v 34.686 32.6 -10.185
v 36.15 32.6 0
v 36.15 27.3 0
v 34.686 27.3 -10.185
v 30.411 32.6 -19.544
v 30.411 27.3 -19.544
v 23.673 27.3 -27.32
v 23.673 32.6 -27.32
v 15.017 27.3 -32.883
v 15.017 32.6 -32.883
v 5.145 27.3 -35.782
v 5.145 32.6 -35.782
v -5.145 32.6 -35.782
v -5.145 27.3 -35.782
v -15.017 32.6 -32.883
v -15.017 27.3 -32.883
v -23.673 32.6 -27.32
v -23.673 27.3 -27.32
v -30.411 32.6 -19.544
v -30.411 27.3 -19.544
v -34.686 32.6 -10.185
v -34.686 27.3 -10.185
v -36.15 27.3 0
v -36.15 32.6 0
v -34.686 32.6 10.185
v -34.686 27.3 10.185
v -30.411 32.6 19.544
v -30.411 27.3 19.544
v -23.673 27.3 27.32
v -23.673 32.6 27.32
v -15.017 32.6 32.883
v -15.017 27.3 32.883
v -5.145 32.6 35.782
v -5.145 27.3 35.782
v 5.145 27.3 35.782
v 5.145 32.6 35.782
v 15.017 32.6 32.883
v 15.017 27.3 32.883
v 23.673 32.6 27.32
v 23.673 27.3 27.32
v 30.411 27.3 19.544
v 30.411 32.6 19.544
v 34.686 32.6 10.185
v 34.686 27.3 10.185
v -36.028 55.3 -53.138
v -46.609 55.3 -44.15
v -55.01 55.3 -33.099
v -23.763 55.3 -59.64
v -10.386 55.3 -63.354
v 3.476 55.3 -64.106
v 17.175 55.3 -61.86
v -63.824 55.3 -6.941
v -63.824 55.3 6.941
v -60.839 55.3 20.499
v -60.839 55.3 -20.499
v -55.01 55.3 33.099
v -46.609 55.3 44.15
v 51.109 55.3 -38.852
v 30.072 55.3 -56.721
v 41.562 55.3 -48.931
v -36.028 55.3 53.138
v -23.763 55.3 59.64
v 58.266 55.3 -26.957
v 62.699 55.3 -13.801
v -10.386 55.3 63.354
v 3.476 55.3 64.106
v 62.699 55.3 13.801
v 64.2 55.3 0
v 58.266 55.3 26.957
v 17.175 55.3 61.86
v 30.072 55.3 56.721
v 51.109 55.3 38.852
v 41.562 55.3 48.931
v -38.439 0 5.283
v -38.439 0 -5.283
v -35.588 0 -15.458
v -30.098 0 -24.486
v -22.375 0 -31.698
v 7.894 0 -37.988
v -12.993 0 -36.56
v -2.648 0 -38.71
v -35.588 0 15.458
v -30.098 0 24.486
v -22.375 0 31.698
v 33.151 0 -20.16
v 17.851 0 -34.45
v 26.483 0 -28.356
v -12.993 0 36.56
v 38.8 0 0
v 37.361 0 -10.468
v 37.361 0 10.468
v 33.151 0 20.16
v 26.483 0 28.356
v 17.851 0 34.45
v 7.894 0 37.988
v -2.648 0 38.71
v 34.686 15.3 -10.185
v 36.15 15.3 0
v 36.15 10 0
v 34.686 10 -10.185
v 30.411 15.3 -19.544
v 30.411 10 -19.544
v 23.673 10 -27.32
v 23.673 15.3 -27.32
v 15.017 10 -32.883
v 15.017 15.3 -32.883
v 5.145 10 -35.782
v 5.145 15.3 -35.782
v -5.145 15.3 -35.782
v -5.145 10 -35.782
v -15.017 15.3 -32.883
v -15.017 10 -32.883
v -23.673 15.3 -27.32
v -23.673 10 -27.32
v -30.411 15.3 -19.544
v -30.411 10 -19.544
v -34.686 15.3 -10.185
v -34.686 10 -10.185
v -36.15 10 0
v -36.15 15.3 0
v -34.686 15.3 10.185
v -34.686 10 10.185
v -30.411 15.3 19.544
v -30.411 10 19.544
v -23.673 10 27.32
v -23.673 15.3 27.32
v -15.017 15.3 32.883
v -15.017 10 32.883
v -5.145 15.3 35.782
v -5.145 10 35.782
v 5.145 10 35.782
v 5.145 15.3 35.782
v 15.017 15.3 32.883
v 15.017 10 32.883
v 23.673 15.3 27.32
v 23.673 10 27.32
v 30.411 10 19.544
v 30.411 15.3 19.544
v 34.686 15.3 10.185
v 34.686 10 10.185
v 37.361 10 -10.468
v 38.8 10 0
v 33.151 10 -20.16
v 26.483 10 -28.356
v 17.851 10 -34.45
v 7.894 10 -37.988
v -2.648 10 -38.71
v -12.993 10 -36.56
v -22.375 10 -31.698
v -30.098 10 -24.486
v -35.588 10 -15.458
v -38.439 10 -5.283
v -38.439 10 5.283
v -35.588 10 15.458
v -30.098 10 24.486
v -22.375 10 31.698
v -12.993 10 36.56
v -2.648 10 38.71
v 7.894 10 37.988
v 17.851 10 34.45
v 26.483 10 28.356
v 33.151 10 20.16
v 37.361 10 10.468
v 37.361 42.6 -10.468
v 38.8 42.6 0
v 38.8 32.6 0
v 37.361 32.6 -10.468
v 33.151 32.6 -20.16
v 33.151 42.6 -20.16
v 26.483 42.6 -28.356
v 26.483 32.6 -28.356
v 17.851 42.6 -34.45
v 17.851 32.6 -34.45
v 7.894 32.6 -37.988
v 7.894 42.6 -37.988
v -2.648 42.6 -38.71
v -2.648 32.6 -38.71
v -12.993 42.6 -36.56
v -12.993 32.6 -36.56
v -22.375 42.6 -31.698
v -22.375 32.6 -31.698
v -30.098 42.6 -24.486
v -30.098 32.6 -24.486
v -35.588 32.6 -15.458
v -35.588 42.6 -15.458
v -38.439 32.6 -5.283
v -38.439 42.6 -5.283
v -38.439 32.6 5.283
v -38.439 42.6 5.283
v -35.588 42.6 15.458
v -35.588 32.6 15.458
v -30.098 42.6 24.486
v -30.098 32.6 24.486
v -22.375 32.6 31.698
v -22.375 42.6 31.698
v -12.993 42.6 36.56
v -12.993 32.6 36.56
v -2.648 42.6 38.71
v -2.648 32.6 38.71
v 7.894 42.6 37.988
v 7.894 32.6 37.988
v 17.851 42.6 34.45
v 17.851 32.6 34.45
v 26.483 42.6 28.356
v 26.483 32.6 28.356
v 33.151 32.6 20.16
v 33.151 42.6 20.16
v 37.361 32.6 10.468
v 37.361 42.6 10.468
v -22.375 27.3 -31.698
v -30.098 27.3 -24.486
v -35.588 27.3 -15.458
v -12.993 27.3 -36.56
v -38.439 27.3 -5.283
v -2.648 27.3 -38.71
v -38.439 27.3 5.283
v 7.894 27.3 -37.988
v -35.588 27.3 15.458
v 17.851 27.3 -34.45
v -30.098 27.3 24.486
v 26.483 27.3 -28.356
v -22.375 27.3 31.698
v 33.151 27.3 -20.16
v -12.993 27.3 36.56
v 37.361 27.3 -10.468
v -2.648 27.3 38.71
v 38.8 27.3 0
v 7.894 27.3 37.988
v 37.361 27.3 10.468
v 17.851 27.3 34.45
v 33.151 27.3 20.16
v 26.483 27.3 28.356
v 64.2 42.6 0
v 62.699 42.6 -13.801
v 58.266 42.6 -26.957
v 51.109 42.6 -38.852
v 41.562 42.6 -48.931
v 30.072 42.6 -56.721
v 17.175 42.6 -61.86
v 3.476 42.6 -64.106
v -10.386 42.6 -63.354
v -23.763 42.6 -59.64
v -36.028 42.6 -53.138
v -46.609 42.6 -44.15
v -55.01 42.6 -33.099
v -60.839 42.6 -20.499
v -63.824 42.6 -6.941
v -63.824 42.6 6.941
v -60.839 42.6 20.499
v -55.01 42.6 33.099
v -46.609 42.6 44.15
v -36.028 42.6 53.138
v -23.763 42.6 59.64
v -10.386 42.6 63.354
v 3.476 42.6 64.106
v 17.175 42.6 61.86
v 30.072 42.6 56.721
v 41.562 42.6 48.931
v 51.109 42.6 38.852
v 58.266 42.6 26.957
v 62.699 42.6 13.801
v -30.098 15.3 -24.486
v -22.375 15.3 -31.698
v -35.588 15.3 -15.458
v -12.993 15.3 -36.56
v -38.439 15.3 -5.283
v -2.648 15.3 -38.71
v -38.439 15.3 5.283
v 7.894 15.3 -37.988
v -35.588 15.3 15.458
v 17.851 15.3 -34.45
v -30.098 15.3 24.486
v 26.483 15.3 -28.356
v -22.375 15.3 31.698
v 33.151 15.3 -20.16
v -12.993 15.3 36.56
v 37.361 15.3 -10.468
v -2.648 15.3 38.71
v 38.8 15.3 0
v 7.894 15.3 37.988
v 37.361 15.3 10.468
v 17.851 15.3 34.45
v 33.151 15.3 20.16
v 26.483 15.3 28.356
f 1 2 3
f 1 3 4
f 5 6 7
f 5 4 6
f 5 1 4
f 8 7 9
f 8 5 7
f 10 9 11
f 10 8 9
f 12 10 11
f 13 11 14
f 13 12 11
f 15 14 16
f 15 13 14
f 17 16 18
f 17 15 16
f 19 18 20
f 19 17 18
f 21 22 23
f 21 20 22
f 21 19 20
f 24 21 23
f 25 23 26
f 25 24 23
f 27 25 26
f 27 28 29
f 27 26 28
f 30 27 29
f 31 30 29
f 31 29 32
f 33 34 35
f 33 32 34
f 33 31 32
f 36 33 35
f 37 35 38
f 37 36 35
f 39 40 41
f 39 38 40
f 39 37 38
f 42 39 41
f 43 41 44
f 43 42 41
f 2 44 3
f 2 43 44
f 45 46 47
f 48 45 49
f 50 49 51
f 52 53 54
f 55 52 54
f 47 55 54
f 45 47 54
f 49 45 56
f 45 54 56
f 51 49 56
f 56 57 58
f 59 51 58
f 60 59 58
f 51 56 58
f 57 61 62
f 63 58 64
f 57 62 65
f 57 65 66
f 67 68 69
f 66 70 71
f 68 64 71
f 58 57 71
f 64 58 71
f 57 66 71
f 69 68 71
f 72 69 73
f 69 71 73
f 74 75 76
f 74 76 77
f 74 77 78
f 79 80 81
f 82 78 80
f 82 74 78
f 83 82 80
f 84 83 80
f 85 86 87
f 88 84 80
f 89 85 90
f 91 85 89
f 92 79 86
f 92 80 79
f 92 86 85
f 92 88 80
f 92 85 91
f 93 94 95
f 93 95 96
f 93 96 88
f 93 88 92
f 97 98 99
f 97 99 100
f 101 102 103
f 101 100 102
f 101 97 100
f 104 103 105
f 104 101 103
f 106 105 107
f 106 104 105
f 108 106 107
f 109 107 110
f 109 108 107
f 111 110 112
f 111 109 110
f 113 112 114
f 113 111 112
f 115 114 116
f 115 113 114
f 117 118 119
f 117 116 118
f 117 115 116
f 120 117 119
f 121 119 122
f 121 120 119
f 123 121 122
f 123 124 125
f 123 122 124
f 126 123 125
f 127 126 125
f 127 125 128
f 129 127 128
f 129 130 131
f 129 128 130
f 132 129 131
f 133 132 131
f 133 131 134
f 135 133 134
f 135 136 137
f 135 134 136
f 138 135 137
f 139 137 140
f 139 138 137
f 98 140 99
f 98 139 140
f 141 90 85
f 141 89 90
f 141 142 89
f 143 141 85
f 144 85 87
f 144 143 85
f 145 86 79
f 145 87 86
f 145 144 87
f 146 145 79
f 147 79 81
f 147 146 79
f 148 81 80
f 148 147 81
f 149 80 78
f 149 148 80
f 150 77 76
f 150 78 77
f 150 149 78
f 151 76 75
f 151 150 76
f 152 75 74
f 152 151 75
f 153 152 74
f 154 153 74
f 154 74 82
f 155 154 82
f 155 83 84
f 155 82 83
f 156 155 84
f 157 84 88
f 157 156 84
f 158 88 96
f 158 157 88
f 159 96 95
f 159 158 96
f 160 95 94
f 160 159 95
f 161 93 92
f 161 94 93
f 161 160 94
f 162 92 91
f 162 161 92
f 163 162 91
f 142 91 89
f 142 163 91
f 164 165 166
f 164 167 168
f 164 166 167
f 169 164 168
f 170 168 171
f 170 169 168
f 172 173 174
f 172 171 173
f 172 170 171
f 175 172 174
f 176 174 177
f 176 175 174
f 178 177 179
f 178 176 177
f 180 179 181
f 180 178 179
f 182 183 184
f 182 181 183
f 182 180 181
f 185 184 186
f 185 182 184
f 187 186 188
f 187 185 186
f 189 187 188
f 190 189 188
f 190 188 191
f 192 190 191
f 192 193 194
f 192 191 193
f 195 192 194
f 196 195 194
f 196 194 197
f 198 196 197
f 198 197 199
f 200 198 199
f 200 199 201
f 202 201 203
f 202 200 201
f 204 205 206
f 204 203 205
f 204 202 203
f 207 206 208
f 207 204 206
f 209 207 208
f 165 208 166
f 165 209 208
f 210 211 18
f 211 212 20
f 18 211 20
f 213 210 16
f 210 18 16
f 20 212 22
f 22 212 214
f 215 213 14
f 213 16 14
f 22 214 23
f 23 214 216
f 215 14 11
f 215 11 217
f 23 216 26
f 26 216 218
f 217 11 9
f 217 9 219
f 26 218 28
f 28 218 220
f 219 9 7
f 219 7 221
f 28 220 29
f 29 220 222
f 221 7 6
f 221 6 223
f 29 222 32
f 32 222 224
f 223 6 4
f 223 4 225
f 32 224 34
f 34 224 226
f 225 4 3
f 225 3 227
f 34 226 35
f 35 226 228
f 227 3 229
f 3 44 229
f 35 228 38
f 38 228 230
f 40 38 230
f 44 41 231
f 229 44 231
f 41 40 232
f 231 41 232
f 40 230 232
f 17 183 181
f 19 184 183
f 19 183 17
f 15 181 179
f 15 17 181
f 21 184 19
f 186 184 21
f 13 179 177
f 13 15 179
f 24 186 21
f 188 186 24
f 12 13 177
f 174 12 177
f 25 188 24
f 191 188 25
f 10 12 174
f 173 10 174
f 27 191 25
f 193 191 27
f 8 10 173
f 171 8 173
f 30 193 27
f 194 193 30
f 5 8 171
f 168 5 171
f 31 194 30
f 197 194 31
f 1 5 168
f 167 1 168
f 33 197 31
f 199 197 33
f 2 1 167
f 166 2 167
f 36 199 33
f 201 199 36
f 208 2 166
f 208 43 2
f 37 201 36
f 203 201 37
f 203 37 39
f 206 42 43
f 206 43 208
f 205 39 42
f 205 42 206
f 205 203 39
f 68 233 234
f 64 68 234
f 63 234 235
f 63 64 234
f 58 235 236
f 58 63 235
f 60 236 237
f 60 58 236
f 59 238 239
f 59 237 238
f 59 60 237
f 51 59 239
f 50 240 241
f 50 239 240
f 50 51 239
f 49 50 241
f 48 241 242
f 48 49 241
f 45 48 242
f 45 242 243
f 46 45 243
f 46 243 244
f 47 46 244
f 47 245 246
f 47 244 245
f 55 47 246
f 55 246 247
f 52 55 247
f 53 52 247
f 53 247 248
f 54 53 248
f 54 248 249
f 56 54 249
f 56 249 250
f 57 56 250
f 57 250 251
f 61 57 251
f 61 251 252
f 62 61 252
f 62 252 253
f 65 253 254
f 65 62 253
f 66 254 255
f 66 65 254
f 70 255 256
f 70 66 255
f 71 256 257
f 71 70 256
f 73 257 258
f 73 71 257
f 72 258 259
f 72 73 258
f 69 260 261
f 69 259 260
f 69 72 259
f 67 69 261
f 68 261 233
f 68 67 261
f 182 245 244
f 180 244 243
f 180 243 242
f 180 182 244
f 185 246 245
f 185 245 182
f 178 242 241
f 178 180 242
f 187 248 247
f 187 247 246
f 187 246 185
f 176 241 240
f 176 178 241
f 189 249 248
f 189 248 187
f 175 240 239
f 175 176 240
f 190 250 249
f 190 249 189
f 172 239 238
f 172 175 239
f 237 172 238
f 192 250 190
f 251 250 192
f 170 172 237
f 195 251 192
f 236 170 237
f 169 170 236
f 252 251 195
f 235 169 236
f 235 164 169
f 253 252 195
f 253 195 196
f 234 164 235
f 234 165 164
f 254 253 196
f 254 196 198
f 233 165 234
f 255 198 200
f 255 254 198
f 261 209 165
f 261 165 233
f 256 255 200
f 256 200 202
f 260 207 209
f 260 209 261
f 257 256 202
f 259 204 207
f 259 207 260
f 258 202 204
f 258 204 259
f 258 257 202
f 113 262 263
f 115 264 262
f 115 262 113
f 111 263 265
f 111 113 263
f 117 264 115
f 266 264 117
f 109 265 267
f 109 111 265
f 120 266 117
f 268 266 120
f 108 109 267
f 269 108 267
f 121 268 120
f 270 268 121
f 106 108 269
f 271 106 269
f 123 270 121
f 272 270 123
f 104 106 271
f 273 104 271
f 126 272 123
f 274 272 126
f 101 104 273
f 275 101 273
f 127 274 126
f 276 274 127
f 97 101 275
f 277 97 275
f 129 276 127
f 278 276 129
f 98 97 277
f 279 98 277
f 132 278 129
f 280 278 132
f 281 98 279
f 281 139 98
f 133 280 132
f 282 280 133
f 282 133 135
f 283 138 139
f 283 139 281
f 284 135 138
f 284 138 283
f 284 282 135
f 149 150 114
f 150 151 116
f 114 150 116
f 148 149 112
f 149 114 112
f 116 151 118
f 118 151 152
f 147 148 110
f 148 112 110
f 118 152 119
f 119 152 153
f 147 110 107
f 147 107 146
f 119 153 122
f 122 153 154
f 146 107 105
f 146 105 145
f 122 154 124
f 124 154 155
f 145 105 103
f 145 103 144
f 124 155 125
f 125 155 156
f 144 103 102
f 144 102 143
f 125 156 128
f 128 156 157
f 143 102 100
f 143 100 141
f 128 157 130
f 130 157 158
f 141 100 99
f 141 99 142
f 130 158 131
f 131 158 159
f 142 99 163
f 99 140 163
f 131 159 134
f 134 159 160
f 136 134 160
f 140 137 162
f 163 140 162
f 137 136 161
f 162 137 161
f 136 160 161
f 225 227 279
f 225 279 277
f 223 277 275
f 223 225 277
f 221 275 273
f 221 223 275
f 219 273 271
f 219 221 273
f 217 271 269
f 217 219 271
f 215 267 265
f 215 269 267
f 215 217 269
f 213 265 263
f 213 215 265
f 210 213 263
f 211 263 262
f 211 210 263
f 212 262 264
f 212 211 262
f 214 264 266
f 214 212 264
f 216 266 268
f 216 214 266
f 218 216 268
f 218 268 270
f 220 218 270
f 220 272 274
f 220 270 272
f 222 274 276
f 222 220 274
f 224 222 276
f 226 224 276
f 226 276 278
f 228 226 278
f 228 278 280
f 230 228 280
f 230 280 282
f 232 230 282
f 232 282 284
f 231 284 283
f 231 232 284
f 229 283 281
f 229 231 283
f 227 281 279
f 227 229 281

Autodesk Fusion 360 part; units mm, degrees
sketch "Sketch1" plane through (0, 0, 0) normal (0, 0, 1) x (1, 0, 0)
  line L0 (0, 0) -> (38.8, 0)
  line L1 (38.8, 0) -> (38.8, 10)
  line L2 (38.8, 10) -> (36.15, 10)
  line L3 (36.15, 10) -> (36.15, 15.3)
  line L4 (36.15, 15.3) -> (38.8, 15.3)
  line L5 (38.8, 15.3) -> (38.8, 27.3)
  line L6 (38.8, 27.3) -> (36.15, 27.3)
  line L7 (36.15, 27.3) -> (36.15, 32.6)
  line L8 (36.15, 32.6) -> (38.8, 32.6)
  line L9 (38.8, 32.6) -> (38.8, 42.6)
  line L10 (38.8, 42.6) -> (64.2, 42.6)
  line L11 (64.2, 42.6) -> (64.2, 55.3)
  line L12 (64.2, 55.3) -> (0, 55.3)
  line L13 (0, 55.3) -> (0, 0)
  dimension "d1" = 38.8
  dimension "d2" = 10
  dimension "d3" = 2.65
  dimension "d4" = 5.3
  dimension "d5" = 2.65
  dimension "d7" = 12
  dimension "d8" = 2.65
  dimension "d9" = 5.3
  dimension "d10" = 2.65
  dimension "d11" = 10
  dimension "d12" = 25.4
  dimension "d13" = 12.7
revolve "Revolve1" add sketch "Sketch1" angle 360 about axis through (0, 55.3, 0) along (0, -1, 0)
sketch "Sketch2" plane through (0, 55.3, 0) normal (0, 1, 0) x (-1, 0, 0)
  circle A0 centre (0, 0) radius 64.2
